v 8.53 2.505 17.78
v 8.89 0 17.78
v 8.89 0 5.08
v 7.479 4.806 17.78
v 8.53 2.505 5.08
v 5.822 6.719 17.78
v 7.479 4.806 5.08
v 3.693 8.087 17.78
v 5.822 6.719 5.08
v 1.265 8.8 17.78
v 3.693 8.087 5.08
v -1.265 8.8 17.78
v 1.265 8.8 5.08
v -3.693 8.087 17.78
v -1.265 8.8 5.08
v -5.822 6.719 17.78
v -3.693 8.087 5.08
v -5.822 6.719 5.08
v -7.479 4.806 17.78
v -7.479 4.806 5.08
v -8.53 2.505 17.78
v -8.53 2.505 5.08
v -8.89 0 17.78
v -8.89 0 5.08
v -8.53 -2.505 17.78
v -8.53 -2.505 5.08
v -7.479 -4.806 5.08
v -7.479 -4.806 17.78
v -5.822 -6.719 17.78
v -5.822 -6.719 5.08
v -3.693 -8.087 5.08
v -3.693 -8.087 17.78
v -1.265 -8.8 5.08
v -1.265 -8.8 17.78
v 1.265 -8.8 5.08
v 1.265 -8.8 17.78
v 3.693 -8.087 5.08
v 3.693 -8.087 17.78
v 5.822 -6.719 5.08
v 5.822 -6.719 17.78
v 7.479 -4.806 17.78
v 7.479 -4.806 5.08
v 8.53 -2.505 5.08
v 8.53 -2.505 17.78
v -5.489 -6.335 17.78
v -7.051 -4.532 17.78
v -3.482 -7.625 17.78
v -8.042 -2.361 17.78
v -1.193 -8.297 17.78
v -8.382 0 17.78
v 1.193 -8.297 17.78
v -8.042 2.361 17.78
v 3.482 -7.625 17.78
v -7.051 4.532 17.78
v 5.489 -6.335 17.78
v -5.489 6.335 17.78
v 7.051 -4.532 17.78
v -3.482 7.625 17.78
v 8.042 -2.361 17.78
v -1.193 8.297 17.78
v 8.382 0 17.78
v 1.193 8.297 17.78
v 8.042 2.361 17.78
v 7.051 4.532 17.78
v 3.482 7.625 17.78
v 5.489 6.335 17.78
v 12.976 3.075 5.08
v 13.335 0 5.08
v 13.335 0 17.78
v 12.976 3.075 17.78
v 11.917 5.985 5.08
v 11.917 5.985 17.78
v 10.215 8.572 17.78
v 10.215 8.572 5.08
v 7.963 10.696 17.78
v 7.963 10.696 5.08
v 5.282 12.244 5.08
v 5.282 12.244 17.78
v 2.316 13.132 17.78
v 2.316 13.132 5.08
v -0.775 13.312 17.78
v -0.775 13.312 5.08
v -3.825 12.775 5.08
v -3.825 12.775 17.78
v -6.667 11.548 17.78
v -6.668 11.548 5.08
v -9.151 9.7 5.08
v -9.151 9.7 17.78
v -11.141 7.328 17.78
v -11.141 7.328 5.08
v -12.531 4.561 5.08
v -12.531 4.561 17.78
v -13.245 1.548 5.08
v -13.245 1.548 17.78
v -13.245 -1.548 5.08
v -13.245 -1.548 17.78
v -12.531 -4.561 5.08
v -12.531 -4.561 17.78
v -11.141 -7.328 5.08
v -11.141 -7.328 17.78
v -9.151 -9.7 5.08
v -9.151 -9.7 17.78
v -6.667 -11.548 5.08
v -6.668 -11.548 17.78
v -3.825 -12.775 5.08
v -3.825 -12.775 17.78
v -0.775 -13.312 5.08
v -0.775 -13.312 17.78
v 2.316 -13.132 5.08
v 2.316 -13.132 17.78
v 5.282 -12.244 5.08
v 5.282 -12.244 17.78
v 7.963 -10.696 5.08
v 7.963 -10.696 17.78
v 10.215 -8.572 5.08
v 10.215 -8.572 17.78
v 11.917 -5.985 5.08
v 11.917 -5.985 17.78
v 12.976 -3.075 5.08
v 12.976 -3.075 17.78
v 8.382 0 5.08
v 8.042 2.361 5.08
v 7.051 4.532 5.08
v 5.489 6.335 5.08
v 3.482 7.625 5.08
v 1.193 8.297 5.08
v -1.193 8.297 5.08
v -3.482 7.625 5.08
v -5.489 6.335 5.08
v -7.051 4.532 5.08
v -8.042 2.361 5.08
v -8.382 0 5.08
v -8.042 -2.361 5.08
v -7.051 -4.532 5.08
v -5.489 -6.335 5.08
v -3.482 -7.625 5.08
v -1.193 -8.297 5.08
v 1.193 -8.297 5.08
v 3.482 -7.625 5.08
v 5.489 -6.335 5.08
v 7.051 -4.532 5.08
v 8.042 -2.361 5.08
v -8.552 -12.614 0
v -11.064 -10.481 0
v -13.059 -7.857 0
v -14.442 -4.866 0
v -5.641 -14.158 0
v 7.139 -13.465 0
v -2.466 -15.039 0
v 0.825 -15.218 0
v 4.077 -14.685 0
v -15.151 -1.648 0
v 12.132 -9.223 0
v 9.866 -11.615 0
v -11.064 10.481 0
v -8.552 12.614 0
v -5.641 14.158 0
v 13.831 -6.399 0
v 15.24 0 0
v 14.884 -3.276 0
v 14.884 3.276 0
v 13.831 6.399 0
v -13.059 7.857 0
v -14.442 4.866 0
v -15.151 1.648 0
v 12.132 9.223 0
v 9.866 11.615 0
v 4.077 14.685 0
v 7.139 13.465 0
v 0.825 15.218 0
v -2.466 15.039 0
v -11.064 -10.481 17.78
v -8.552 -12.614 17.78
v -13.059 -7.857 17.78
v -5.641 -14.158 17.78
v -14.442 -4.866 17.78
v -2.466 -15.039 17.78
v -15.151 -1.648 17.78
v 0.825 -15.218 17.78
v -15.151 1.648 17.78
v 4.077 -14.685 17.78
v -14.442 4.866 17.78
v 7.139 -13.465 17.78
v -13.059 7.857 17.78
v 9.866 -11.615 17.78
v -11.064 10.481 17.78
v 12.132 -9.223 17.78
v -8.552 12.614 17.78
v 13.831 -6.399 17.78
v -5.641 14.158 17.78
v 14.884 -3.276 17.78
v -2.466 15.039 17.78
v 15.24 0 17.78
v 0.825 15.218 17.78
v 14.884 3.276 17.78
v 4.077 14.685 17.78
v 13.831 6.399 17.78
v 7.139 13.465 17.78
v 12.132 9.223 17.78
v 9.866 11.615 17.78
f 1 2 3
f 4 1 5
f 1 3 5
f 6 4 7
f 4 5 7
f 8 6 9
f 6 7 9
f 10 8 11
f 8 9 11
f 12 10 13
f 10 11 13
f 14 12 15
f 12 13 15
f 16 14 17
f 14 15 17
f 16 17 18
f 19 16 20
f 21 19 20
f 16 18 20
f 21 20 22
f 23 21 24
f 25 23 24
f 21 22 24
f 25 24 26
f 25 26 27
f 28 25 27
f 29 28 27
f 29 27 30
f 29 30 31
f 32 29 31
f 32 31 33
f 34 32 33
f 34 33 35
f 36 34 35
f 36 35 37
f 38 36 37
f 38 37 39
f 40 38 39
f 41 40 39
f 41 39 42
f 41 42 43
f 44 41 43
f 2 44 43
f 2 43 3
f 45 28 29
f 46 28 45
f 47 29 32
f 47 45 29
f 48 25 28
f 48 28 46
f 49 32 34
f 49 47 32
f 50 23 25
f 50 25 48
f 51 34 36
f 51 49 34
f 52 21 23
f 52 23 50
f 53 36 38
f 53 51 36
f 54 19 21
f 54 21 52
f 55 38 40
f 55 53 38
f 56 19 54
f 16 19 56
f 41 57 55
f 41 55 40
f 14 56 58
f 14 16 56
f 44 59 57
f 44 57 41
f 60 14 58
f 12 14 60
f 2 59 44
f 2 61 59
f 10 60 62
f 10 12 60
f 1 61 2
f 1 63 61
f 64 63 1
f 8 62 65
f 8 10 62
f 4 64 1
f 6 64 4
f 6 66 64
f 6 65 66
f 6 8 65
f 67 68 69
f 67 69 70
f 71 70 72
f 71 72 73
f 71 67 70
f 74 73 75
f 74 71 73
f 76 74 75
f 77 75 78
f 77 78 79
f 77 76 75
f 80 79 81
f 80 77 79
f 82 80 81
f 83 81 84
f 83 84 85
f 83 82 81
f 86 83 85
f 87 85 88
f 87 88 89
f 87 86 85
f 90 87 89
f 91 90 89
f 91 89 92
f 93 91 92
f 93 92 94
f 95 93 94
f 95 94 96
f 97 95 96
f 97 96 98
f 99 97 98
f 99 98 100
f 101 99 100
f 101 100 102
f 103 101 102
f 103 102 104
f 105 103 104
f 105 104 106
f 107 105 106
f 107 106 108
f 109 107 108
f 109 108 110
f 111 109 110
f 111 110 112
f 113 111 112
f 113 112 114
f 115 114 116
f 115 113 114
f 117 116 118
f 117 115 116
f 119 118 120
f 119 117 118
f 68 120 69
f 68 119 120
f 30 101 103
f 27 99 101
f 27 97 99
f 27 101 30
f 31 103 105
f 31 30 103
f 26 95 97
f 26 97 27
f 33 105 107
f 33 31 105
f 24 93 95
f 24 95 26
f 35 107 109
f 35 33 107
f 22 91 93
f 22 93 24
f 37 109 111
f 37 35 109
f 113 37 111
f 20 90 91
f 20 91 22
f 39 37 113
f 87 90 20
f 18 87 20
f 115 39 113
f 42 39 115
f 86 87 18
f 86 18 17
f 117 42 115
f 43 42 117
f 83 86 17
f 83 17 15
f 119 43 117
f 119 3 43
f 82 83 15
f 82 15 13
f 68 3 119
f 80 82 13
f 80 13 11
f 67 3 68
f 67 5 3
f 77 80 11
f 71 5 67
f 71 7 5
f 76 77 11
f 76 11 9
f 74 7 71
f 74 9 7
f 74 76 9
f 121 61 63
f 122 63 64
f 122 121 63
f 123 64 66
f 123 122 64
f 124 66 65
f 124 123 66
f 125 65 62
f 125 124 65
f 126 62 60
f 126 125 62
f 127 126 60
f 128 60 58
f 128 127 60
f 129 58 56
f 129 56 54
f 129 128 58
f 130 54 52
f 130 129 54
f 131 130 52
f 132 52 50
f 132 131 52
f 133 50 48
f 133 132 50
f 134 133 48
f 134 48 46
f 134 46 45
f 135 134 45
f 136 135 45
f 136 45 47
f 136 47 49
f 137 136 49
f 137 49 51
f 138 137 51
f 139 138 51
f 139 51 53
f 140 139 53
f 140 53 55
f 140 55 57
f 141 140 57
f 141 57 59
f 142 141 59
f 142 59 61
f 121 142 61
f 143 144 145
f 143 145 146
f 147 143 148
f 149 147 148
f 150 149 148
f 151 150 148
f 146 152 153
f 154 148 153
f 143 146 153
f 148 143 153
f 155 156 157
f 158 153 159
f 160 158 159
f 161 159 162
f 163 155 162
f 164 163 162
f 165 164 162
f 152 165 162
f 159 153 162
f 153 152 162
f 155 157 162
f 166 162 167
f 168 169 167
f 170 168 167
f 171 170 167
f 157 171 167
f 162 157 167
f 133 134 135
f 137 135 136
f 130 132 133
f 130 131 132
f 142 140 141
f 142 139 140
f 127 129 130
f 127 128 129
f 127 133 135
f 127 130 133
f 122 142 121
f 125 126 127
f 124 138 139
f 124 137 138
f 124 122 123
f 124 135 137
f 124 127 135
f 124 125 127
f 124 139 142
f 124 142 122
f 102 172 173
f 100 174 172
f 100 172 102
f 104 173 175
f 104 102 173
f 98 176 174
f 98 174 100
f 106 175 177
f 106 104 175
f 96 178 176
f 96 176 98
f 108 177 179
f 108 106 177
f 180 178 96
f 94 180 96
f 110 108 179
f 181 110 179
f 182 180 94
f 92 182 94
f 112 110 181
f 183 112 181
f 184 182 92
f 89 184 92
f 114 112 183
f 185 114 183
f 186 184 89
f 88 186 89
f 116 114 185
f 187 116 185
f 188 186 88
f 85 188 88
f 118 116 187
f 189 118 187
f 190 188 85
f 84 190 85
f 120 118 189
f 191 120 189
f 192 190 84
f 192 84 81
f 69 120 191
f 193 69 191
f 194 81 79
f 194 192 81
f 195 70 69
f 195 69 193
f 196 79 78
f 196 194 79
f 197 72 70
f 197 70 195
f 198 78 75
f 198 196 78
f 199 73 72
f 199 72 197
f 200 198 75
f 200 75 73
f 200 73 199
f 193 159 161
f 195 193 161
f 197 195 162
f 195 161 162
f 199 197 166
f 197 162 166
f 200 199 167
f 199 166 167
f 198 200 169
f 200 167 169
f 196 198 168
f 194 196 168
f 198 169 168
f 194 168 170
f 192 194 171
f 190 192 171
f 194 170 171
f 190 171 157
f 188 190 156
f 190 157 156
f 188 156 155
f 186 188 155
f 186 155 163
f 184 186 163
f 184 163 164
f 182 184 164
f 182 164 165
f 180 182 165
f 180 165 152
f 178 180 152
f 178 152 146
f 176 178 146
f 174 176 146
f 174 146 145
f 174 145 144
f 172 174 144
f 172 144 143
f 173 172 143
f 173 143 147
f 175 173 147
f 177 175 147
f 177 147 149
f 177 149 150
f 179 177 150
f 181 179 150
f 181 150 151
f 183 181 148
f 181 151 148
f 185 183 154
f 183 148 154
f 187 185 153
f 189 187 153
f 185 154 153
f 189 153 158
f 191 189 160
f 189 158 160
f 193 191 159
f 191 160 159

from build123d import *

# Parameters (mm, degrees)
F0_R     = 15.24
F0_R_2   = 13.335
F0_R_3   = 8.89
F0_R_4   = 8.382
F1_DEPTH = 5.08
F2_DEPTH = 17.78
F3_DEPTH = 17.78


with BuildPart() as f1:
    # F0 (on Top) → F1 (new body)
    with BuildSketch(Plane.XY):
        Circle(F0_R)
        Circle(F0_R_2, mode=Mode.SUBTRACT)
        Circle(F0_R_2)
        Circle(F0_R_3, mode=Mode.SUBTRACT)
        Circle(F0_R_3)
        Circle(F0_R_4, mode=Mode.SUBTRACT)
        Circle(F0_R_4)
    extrude(amount=F1_DEPTH)

    # F0 (on Top) → F2 (join)
    with BuildSketch(Plane.XY):
        Circle(F0_R)
        Circle(F0_R_2, mode=Mode.SUBTRACT)
    extrude(amount=F2_DEPTH)

    # F0 (on Top) → F3 (join)
    with BuildSketch(Plane.XY):
        Circle(F0_R_3)
        Circle(F0_R_4, mode=Mode.SUBTRACT)
    extrude(amount=F3_DEPTH)


solid = f1.part
